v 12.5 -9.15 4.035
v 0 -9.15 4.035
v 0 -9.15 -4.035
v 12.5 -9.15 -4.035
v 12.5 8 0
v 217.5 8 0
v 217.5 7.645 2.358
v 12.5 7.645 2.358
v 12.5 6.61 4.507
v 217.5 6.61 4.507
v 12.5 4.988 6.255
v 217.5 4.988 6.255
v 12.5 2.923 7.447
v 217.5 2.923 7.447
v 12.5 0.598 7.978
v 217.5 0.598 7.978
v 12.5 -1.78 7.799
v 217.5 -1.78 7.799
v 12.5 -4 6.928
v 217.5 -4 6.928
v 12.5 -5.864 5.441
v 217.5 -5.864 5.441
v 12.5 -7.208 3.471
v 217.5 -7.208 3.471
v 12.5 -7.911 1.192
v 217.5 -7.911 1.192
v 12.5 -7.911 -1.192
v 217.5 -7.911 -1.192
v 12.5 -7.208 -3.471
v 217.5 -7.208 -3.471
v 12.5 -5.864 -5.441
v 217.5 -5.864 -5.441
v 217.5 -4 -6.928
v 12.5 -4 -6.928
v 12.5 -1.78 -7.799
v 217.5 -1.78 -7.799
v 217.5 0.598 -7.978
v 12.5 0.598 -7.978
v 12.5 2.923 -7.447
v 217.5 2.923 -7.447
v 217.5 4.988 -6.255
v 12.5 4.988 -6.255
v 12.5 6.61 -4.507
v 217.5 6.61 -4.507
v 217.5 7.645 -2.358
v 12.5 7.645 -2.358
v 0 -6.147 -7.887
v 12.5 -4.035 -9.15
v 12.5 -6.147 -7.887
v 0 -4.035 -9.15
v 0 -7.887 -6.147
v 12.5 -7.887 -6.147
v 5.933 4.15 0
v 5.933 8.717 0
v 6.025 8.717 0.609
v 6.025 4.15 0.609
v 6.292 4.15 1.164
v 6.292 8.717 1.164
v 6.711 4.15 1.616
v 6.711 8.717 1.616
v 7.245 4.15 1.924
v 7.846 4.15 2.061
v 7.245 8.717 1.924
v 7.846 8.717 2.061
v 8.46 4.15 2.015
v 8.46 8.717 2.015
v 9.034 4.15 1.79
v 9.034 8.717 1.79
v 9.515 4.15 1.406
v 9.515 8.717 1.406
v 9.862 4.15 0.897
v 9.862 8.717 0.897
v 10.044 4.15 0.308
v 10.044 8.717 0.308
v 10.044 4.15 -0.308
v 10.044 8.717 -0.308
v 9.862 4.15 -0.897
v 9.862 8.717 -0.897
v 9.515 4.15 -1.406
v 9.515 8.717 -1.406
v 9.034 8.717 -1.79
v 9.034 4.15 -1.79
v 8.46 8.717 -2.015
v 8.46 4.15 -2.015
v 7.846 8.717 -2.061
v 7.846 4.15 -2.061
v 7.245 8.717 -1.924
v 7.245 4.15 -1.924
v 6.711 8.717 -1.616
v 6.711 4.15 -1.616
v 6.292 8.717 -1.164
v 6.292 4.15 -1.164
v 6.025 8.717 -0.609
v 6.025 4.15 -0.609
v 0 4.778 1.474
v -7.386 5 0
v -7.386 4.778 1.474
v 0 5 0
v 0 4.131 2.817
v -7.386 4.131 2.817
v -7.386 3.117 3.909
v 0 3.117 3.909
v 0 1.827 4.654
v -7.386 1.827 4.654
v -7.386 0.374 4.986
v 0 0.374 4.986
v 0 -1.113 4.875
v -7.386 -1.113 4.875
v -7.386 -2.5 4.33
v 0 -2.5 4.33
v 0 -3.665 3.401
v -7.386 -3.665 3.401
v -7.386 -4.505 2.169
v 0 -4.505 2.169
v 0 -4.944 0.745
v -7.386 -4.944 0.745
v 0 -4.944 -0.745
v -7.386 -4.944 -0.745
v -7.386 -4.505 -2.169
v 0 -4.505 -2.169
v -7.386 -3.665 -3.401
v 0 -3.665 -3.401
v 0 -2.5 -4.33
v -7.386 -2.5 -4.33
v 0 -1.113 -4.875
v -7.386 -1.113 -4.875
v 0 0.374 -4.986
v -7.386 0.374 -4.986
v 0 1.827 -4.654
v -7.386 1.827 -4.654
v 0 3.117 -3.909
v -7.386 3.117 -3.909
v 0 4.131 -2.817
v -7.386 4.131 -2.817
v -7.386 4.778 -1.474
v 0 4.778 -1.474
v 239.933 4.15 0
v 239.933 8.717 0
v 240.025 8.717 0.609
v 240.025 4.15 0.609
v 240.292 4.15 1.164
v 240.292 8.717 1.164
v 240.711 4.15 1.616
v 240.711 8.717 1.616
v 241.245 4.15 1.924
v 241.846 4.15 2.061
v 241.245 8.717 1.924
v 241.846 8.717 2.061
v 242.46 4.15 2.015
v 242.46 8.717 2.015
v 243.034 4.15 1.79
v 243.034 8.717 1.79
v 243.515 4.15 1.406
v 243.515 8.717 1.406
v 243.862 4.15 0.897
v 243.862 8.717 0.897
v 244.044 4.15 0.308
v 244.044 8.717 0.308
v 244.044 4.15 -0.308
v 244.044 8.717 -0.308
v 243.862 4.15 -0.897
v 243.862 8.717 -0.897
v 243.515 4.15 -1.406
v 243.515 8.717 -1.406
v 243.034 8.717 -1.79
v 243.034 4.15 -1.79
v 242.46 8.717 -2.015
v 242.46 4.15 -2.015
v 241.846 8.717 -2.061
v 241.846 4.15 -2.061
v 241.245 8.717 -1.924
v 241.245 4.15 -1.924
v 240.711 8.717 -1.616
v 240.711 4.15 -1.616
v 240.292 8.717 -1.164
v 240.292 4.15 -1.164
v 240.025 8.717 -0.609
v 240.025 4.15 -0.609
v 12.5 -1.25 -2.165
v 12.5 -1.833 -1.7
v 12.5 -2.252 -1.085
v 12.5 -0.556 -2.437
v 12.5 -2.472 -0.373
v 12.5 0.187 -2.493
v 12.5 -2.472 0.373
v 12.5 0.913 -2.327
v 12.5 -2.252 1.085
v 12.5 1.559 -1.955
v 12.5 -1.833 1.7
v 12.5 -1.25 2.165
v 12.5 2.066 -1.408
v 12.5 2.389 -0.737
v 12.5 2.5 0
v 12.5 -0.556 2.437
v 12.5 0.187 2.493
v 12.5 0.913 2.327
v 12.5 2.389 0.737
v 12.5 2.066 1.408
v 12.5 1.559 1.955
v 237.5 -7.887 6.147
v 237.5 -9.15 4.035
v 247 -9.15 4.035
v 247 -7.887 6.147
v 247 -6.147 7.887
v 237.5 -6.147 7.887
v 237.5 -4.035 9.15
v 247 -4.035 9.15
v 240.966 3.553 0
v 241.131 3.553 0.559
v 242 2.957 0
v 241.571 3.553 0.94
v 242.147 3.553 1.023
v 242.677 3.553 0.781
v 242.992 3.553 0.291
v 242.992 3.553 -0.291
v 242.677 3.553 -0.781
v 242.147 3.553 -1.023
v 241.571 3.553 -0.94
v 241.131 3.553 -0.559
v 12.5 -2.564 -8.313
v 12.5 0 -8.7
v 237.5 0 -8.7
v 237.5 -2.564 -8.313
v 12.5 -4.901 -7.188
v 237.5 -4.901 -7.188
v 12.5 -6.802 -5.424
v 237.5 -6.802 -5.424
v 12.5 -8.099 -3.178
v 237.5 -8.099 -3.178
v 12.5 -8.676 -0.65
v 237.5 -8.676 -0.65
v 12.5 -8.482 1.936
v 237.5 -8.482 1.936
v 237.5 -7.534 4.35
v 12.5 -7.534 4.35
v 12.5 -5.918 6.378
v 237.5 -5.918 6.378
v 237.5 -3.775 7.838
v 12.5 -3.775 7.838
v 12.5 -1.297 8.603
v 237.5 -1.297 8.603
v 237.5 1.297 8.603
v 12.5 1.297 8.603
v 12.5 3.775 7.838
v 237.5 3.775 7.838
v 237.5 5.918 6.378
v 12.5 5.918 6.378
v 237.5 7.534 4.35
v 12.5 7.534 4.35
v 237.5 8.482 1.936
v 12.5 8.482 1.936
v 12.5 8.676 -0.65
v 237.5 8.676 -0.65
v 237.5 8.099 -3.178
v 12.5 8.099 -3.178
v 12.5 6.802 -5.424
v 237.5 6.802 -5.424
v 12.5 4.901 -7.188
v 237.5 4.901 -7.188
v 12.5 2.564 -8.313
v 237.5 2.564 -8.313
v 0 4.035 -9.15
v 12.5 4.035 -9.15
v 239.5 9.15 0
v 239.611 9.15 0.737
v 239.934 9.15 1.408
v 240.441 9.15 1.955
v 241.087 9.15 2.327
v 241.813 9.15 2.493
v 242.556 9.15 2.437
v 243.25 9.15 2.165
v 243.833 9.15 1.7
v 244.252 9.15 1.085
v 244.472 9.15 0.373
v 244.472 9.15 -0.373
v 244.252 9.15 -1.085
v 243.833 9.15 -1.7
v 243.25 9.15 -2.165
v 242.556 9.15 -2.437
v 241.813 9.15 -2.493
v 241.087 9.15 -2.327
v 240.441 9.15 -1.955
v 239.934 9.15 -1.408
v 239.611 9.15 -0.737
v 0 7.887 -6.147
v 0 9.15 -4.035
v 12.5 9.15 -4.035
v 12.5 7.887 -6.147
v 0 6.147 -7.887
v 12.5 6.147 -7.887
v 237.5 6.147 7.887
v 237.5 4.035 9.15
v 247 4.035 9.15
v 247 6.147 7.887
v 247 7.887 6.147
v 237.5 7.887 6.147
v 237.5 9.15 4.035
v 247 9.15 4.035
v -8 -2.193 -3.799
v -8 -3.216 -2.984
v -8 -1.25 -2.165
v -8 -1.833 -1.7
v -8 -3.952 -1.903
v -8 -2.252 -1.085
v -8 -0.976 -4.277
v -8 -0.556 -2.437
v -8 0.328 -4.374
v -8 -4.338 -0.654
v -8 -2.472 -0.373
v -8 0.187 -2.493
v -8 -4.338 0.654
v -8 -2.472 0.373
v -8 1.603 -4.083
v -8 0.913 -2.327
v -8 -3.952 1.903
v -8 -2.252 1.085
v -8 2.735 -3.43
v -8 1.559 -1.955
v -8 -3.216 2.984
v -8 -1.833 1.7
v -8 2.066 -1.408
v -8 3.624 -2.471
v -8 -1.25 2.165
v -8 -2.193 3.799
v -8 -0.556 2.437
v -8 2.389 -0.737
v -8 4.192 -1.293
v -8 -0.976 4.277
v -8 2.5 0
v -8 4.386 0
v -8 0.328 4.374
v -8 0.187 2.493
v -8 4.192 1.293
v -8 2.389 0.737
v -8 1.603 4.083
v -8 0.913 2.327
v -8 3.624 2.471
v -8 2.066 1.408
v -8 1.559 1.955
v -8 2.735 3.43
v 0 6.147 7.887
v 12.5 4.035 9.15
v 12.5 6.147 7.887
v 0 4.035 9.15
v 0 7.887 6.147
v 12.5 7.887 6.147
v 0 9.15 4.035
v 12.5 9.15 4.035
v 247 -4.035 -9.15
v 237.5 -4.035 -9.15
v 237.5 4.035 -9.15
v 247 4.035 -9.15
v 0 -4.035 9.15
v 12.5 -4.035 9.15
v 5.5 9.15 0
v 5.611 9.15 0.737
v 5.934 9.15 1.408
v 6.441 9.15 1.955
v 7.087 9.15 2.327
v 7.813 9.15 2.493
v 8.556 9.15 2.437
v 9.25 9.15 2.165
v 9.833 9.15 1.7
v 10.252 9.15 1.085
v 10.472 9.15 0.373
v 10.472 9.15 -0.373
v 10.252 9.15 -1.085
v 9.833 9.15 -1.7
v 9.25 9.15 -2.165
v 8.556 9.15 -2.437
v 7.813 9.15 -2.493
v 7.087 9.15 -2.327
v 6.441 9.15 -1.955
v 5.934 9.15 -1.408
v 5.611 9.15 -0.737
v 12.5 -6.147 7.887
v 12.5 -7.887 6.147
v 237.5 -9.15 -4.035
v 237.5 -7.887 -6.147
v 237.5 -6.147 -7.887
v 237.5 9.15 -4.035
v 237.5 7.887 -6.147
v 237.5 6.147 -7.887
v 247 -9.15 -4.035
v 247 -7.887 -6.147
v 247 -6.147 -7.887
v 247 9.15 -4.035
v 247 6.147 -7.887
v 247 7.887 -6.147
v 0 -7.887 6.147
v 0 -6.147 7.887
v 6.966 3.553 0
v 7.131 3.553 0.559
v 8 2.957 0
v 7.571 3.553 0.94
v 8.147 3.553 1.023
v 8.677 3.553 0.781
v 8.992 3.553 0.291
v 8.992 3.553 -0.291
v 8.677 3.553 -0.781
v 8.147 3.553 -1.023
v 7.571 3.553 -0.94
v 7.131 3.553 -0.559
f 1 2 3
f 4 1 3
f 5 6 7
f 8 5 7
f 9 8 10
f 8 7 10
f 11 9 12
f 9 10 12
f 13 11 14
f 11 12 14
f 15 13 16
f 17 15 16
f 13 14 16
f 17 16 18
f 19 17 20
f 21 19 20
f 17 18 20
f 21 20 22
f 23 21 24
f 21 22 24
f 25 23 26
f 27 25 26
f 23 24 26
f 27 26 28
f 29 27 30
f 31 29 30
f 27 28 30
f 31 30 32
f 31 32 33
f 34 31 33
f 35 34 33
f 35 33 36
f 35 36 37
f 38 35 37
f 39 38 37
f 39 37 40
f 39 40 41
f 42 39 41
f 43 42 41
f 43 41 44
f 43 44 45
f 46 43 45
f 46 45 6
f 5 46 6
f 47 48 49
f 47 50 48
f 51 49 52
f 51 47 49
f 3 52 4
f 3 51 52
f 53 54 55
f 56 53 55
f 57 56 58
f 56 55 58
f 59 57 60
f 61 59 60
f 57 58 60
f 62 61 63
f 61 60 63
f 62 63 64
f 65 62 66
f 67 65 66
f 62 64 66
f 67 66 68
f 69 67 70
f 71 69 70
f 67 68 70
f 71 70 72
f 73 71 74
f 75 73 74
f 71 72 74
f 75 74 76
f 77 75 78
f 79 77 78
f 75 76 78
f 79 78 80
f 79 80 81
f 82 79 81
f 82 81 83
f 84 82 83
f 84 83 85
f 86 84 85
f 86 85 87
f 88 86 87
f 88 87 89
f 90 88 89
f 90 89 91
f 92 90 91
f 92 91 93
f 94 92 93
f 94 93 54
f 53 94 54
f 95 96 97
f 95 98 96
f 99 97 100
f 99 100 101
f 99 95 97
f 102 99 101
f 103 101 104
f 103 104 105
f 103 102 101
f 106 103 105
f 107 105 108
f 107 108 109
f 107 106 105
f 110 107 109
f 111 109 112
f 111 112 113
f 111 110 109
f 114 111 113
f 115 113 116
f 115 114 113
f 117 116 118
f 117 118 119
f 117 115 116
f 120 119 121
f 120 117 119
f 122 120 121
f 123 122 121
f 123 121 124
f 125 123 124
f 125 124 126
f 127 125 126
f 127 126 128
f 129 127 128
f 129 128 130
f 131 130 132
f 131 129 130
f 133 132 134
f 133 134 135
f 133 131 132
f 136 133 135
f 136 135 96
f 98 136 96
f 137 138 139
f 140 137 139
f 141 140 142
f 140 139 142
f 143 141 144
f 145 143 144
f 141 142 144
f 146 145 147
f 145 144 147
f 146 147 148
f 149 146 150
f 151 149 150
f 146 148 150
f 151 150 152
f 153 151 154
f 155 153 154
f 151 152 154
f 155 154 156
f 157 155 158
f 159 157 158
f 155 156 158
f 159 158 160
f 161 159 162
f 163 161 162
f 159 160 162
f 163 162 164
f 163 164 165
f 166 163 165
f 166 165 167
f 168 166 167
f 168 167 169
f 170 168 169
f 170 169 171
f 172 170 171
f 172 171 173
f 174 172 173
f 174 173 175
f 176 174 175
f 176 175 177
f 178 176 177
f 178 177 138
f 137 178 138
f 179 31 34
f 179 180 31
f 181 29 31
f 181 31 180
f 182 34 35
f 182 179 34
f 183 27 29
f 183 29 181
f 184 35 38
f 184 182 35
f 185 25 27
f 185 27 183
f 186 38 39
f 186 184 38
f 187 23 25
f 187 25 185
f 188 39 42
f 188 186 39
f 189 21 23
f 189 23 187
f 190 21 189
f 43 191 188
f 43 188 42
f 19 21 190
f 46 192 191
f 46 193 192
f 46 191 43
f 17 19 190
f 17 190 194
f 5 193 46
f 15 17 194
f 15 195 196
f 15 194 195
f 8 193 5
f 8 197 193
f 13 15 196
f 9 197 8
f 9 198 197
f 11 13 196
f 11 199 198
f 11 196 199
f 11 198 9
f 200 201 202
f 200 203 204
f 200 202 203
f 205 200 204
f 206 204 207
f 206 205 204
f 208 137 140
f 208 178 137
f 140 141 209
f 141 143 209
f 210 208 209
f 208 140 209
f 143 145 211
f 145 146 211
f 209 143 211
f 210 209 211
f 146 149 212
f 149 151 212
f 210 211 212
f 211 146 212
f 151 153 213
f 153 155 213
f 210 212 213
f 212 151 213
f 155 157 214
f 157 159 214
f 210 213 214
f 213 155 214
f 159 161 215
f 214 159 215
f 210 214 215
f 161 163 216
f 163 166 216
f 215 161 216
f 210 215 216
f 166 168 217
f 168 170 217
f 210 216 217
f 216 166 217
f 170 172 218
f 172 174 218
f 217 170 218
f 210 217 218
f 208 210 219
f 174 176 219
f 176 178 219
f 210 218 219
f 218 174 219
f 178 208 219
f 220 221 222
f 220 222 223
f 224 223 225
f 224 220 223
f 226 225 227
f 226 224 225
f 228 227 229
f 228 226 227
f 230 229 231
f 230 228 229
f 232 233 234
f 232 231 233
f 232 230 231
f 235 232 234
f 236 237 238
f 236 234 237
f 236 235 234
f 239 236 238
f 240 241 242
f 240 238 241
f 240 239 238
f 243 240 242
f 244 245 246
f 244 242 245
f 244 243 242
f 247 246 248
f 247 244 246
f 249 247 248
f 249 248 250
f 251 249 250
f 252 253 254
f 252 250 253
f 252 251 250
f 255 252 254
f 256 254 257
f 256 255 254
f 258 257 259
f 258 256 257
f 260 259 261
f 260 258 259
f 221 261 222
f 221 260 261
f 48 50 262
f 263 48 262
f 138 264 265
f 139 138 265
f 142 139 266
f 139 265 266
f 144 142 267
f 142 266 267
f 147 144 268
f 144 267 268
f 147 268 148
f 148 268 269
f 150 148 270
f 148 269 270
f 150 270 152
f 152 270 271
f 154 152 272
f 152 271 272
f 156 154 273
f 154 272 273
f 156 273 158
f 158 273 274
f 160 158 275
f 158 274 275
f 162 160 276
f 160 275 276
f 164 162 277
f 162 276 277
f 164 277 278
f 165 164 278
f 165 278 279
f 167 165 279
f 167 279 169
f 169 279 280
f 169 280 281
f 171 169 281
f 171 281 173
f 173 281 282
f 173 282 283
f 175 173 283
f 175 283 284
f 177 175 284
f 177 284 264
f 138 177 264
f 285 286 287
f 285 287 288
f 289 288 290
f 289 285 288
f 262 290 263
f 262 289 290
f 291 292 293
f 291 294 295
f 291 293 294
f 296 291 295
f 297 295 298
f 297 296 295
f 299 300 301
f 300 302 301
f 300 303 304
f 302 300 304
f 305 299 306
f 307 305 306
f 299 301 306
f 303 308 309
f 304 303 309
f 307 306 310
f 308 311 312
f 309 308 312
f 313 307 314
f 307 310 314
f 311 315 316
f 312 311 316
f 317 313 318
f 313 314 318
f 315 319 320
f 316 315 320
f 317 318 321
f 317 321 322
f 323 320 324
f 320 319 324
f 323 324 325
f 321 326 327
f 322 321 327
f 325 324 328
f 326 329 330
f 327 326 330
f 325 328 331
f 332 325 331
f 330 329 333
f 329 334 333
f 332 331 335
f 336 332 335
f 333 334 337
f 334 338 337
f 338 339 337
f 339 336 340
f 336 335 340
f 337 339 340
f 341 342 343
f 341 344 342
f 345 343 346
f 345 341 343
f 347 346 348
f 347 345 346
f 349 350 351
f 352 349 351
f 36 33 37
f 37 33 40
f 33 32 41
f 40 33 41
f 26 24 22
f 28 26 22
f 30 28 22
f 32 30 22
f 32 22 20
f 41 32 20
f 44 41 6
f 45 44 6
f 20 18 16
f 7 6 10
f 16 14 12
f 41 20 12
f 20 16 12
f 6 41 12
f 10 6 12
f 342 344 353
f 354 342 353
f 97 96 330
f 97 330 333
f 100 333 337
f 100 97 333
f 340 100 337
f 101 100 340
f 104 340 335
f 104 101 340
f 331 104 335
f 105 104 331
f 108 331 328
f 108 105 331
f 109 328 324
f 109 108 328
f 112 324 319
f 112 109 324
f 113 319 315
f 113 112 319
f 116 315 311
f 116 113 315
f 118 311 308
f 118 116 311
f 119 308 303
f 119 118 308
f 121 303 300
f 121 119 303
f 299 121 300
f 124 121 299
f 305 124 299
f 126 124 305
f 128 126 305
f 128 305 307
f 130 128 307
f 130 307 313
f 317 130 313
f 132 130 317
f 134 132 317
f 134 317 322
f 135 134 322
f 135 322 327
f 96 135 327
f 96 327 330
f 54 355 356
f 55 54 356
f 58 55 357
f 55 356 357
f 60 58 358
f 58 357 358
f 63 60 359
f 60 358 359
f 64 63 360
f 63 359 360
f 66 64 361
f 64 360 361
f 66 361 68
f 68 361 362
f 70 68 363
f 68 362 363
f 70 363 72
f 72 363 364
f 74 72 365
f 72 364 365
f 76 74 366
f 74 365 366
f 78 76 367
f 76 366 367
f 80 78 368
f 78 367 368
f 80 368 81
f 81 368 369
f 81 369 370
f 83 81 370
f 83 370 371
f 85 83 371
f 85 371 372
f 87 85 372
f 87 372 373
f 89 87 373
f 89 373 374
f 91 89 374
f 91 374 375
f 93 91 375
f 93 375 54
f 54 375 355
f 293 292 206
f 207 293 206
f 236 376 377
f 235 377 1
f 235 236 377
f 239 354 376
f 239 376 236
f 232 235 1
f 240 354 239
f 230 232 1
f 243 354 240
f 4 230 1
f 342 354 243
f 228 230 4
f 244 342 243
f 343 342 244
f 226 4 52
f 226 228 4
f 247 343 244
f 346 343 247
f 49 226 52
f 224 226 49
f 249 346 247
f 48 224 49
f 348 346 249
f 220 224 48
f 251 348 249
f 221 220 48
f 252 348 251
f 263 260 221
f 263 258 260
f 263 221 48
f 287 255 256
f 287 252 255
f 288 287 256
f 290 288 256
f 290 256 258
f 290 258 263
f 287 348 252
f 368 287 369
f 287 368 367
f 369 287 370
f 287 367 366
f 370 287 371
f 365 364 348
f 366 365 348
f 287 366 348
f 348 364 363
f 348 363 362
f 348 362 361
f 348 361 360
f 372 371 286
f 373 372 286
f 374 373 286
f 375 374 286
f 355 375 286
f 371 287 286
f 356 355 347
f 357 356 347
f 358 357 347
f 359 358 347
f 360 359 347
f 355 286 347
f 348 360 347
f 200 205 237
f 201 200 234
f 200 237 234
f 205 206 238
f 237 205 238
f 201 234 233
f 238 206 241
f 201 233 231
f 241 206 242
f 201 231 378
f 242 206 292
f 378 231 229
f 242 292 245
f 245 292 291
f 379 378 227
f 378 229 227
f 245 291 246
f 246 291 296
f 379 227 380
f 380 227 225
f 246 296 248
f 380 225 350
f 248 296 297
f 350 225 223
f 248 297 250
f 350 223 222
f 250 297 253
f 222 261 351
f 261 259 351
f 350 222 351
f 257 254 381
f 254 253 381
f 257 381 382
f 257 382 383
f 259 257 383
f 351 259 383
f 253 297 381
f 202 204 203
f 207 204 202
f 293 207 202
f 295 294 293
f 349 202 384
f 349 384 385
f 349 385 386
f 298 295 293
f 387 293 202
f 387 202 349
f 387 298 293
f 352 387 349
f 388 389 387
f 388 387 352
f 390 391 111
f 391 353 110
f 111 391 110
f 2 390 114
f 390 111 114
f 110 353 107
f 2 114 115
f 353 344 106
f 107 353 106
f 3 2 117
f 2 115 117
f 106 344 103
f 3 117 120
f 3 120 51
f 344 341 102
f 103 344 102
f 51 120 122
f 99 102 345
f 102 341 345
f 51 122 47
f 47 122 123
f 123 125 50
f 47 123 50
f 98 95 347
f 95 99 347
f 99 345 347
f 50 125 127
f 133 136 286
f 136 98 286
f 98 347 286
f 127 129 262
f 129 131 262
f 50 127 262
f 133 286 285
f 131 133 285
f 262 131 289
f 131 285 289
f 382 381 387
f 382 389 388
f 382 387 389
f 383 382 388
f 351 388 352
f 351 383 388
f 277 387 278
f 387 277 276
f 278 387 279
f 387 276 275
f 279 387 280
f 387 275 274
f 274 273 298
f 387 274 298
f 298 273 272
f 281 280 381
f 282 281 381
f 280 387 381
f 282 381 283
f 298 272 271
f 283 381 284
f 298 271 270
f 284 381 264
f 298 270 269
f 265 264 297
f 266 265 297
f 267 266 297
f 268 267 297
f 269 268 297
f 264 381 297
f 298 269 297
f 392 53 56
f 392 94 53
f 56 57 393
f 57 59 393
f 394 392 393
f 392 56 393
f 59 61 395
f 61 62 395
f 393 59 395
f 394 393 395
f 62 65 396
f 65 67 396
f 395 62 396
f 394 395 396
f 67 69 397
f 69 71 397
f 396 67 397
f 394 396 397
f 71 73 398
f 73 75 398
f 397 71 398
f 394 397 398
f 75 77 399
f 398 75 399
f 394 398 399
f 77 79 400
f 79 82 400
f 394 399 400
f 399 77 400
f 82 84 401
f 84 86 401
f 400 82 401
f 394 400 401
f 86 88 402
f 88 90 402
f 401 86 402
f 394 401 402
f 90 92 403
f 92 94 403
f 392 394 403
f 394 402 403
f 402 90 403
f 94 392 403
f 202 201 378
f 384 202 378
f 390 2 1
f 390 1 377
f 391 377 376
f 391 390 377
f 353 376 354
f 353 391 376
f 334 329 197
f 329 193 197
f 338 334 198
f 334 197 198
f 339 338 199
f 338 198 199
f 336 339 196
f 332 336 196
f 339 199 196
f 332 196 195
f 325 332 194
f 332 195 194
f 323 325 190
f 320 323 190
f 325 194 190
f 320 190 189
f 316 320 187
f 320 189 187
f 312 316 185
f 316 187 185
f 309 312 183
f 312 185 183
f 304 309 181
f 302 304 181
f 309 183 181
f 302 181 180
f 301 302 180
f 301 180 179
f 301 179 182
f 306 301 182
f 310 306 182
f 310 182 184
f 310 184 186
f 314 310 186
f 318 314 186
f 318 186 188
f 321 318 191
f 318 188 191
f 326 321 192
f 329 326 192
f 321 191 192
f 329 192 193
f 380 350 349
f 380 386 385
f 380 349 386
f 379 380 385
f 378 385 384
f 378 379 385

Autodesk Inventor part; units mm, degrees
sketch "Sketch_8" plane through (0, 0, 0) normal (0, 0, 1) x (1, 0, 0)
  line L0 (0, 0) -> (-8, 0)
  line L1 (-8, 0) -> (-8, 4.3865)
  line L2 (-8, 4.3865) -> (-7.3865, 5)
  line L3 (-7.3865, 5) -> (0, 5)
  line L4 (0, 5) -> (0, 0)
  line L5 (0, 0) -> (-8, 0)
revolve "Revolution1" add sketch "Sketch_8" angle 360 about axis through (0, 0, 0) along (1, 0, 0)
thread "Thread1" size "M10x1" class "6g" standard "ISO Metric profile" length 5.8865
sketch "Sketch_9" plane through (0, 0, 0) normal (1, 0, 0) x (0, 0, -1)
  line L0 (-9.15, 4.0345) -> (-9.15, -4.0345)
  arc A0 (-9.15, -4.0345) -> (-4.0345, -9.15) centre (0, 0) ccw
  line L1 (-4.0345, -9.15) -> (4.0345, -9.15)
  arc A1 (4.0345, -9.15) -> (9.15, -4.0345) centre (0, 0) ccw
  line L2 (9.15, -4.0345) -> (9.15, 4.0345)
  arc A2 (9.15, 4.0345) -> (4.0345, 9.15) centre (0, 0) ccw
  line L3 (4.0345, 9.15) -> (-4.0345, 9.15)
  arc A3 (-4.0345, 9.15) -> (-9.15, 4.0345) centre (0, 0) ccw
extrude "Extrusion1" add sketch "Sketch_9" along normal blind 12.5
sketch "Sketch_11" plane through (12.5, 0, 0) normal (1, 0, 0) x (0, 0, -1)
  circle A0 centre (0, 0) radius 8.7
extrude "Extrusion2" add sketch "Sketch_11" along normal blind 225
sketch "Sketch_10" plane through (237.5, 0, 0) normal (1, 0, 0) x (0, 0, -1)
  line L0 (-9.15, 4.0345) -> (-9.15, -4.0345)
  arc A0 (-9.15, -4.0345) -> (-4.0345, -9.15) centre (0, 0) ccw
  line L1 (-4.0345, -9.15) -> (4.0345, -9.15)
  arc A1 (4.0345, -9.15) -> (9.15, -4.0345) centre (0, 0) ccw
  line L2 (9.15, -4.0345) -> (9.15, 4.0345)
  arc A2 (9.15, 4.0345) -> (4.0345, 9.15) centre (0, 0) ccw
  line L3 (4.0345, 9.15) -> (-4.0345, 9.15)
  arc A3 (-4.0345, 9.15) -> (-9.15, 4.0345) centre (0, 0) ccw
extrude "Extrusion3" add sketch "Sketch_10" along normal blind 9.5
sketch "Sketch7" plane through (0, 0, 0) normal (0, 0, 1) x (1, 0, 0)
  line L0 (8, 9.15) -> (8, 4.15)
  line L1 (8, 2.9566) -> (5.933, 4.15)
  line L2 (5.933, 4.15) -> (5.933, 8.717)
  line L3 (5.933, 8.717) -> (5.5, 9.15)
  line L4 (5.5, 9.15) -> (8, 9.15)
  line L5 (8, 9.15) -> (8, 2.9566)
revolve "Revolution2" cut sketch "Sketch7" angle 360 about axis through (8, 9.15, 0) along (0, 1, 0)
thread "Thread2" size "M5x0.8" class "6H" standard "ISO Metric profile" full length
sketch "Sketch_7" plane through (0, 0, 0) normal (0, 0, 1) x (1, 0, 0)
  line L0 (242, 9.15) -> (242, 4.15)
  line L1 (242, 2.9566) -> (239.933, 4.15)
  line L2 (239.933, 4.15) -> (239.933, 8.717)
  line L3 (239.933, 8.717) -> (239.5, 9.15)
  line L4 (239.5, 9.15) -> (242, 9.15)
  line L5 (242, 9.15) -> (242, 2.9566)
revolve "Revolution3" cut sketch "Sketch_7" angle 360 about axis through (242, 9.15, 0) along (0, 1, 0)
thread "Thread3" size "M5x0.8" class "6H" standard "ISO Metric profile" full length
sketch "Sketch_16" plane through (0, 0, 0) normal (0, 0, 1) x (1, 0, 0)
  line L0 (217.5, 0) -> (-8, 0)
  line L1 (-8, 0) -> (-8, 2.5)
  line L2 (-8, 2.5) -> (12.5, 2.5)
  line L3 (12.5, 2.5) -> (12.5, 8)
  line L4 (12.5, 8) -> (217.5, 8)
  line L5 (217.5, 8) -> (217.5, 0)
  line L6 (217.5, 0) -> (-8, 0)
revolve "Revolution4" cut sketch "Sketch_16" angle 360 about axis through (217.5, 0, 0) along (1, 0, 0)
ref_plane "BODY_N_XY" through (247, 0, 0) normal (0, 0, -1) x (1, 0, 0)
ref_plane "BODY_N_YZ" through (247, 0, 0) normal (1, 0, 0) x (0, -1, 0)
ref_plane "BODY_N_ZX" through (247, 0, 0) normal (0, -1, 0) x (0, 0, -1)
ref_plane "NUT2_XY" through (247, 0, 0) normal (1, 0, 0) x (0, 0, -1)
ref_plane "NUT2_YZ" through (247, 0, 0) normal (0, 0, -1) x (0, 1, 0)
ref_plane "NUT2_ZX" through (247, 0, 0) normal (0, 1, 0) x (1, 0, 0)
ref_plane "SW1_XY" through (17.5, 0, 0) normal (1, 0, 0) x (0, 0, -1)
ref_plane "SW1_YZ" through (17.5, 0, 0) normal (0, 0, -1) x (0, 1, 0)
ref_plane "SW1_ZX" through (17.5, 0, 0) normal (0, 1, 0) x (1, 0, 0)
ref_plane "SW2_XY" through (232.5, 0, 0) normal (-1, 0, 0) x (0, 0, -1)
ref_plane "SW2_YZ" through (232.5, 0, 0) normal (0, 0, -1) x (0, -1, 0)
ref_plane "SW2_ZX" through (232.5, 0, 0) normal (0, -1, 0) x (-1, 0, 0)
ref_plane "SW_R1_XY" through (17.5, -14.15, 0) normal (1, 0, 0) x (0, 0, -1)
ref_plane "SW_R1_YZ" through (17.5, -14.15, 0) normal (0, 0, -1) x (0, 1, 0)
ref_plane "SW_R1_ZX" through (17.5, -14.15, 0) normal (0, 1, 0) x (1, 0, 0)
ref_plane "SW_R2_XY" through (232.5, -14.15, 0) normal (-1, 0, 0) x (0, 0, -1)
ref_plane "SW_R2_YZ" through (232.5, -14.15, 0) normal (0, 0, -1) x (0, -1, 0)
ref_plane "SW_R2_ZX" through (232.5, -14.15, 0) normal (0, -1, 0) x (-1, 0, 0)
ref_plane "body_XY" through (0, 0, 0) normal (1, 0, 0) x (0, 0, -1)
ref_plane "body_YZ" through (0, 0, 0) normal (0, 0, -1) x (0, 1, 0)
ref_plane "body_ZX" through (0, 0, 0) normal (0, 1, 0) x (1, 0, 0)
properties part number "CJ2B16-200Z(1_0)_BODY" material "鉄、鋳鉄"
